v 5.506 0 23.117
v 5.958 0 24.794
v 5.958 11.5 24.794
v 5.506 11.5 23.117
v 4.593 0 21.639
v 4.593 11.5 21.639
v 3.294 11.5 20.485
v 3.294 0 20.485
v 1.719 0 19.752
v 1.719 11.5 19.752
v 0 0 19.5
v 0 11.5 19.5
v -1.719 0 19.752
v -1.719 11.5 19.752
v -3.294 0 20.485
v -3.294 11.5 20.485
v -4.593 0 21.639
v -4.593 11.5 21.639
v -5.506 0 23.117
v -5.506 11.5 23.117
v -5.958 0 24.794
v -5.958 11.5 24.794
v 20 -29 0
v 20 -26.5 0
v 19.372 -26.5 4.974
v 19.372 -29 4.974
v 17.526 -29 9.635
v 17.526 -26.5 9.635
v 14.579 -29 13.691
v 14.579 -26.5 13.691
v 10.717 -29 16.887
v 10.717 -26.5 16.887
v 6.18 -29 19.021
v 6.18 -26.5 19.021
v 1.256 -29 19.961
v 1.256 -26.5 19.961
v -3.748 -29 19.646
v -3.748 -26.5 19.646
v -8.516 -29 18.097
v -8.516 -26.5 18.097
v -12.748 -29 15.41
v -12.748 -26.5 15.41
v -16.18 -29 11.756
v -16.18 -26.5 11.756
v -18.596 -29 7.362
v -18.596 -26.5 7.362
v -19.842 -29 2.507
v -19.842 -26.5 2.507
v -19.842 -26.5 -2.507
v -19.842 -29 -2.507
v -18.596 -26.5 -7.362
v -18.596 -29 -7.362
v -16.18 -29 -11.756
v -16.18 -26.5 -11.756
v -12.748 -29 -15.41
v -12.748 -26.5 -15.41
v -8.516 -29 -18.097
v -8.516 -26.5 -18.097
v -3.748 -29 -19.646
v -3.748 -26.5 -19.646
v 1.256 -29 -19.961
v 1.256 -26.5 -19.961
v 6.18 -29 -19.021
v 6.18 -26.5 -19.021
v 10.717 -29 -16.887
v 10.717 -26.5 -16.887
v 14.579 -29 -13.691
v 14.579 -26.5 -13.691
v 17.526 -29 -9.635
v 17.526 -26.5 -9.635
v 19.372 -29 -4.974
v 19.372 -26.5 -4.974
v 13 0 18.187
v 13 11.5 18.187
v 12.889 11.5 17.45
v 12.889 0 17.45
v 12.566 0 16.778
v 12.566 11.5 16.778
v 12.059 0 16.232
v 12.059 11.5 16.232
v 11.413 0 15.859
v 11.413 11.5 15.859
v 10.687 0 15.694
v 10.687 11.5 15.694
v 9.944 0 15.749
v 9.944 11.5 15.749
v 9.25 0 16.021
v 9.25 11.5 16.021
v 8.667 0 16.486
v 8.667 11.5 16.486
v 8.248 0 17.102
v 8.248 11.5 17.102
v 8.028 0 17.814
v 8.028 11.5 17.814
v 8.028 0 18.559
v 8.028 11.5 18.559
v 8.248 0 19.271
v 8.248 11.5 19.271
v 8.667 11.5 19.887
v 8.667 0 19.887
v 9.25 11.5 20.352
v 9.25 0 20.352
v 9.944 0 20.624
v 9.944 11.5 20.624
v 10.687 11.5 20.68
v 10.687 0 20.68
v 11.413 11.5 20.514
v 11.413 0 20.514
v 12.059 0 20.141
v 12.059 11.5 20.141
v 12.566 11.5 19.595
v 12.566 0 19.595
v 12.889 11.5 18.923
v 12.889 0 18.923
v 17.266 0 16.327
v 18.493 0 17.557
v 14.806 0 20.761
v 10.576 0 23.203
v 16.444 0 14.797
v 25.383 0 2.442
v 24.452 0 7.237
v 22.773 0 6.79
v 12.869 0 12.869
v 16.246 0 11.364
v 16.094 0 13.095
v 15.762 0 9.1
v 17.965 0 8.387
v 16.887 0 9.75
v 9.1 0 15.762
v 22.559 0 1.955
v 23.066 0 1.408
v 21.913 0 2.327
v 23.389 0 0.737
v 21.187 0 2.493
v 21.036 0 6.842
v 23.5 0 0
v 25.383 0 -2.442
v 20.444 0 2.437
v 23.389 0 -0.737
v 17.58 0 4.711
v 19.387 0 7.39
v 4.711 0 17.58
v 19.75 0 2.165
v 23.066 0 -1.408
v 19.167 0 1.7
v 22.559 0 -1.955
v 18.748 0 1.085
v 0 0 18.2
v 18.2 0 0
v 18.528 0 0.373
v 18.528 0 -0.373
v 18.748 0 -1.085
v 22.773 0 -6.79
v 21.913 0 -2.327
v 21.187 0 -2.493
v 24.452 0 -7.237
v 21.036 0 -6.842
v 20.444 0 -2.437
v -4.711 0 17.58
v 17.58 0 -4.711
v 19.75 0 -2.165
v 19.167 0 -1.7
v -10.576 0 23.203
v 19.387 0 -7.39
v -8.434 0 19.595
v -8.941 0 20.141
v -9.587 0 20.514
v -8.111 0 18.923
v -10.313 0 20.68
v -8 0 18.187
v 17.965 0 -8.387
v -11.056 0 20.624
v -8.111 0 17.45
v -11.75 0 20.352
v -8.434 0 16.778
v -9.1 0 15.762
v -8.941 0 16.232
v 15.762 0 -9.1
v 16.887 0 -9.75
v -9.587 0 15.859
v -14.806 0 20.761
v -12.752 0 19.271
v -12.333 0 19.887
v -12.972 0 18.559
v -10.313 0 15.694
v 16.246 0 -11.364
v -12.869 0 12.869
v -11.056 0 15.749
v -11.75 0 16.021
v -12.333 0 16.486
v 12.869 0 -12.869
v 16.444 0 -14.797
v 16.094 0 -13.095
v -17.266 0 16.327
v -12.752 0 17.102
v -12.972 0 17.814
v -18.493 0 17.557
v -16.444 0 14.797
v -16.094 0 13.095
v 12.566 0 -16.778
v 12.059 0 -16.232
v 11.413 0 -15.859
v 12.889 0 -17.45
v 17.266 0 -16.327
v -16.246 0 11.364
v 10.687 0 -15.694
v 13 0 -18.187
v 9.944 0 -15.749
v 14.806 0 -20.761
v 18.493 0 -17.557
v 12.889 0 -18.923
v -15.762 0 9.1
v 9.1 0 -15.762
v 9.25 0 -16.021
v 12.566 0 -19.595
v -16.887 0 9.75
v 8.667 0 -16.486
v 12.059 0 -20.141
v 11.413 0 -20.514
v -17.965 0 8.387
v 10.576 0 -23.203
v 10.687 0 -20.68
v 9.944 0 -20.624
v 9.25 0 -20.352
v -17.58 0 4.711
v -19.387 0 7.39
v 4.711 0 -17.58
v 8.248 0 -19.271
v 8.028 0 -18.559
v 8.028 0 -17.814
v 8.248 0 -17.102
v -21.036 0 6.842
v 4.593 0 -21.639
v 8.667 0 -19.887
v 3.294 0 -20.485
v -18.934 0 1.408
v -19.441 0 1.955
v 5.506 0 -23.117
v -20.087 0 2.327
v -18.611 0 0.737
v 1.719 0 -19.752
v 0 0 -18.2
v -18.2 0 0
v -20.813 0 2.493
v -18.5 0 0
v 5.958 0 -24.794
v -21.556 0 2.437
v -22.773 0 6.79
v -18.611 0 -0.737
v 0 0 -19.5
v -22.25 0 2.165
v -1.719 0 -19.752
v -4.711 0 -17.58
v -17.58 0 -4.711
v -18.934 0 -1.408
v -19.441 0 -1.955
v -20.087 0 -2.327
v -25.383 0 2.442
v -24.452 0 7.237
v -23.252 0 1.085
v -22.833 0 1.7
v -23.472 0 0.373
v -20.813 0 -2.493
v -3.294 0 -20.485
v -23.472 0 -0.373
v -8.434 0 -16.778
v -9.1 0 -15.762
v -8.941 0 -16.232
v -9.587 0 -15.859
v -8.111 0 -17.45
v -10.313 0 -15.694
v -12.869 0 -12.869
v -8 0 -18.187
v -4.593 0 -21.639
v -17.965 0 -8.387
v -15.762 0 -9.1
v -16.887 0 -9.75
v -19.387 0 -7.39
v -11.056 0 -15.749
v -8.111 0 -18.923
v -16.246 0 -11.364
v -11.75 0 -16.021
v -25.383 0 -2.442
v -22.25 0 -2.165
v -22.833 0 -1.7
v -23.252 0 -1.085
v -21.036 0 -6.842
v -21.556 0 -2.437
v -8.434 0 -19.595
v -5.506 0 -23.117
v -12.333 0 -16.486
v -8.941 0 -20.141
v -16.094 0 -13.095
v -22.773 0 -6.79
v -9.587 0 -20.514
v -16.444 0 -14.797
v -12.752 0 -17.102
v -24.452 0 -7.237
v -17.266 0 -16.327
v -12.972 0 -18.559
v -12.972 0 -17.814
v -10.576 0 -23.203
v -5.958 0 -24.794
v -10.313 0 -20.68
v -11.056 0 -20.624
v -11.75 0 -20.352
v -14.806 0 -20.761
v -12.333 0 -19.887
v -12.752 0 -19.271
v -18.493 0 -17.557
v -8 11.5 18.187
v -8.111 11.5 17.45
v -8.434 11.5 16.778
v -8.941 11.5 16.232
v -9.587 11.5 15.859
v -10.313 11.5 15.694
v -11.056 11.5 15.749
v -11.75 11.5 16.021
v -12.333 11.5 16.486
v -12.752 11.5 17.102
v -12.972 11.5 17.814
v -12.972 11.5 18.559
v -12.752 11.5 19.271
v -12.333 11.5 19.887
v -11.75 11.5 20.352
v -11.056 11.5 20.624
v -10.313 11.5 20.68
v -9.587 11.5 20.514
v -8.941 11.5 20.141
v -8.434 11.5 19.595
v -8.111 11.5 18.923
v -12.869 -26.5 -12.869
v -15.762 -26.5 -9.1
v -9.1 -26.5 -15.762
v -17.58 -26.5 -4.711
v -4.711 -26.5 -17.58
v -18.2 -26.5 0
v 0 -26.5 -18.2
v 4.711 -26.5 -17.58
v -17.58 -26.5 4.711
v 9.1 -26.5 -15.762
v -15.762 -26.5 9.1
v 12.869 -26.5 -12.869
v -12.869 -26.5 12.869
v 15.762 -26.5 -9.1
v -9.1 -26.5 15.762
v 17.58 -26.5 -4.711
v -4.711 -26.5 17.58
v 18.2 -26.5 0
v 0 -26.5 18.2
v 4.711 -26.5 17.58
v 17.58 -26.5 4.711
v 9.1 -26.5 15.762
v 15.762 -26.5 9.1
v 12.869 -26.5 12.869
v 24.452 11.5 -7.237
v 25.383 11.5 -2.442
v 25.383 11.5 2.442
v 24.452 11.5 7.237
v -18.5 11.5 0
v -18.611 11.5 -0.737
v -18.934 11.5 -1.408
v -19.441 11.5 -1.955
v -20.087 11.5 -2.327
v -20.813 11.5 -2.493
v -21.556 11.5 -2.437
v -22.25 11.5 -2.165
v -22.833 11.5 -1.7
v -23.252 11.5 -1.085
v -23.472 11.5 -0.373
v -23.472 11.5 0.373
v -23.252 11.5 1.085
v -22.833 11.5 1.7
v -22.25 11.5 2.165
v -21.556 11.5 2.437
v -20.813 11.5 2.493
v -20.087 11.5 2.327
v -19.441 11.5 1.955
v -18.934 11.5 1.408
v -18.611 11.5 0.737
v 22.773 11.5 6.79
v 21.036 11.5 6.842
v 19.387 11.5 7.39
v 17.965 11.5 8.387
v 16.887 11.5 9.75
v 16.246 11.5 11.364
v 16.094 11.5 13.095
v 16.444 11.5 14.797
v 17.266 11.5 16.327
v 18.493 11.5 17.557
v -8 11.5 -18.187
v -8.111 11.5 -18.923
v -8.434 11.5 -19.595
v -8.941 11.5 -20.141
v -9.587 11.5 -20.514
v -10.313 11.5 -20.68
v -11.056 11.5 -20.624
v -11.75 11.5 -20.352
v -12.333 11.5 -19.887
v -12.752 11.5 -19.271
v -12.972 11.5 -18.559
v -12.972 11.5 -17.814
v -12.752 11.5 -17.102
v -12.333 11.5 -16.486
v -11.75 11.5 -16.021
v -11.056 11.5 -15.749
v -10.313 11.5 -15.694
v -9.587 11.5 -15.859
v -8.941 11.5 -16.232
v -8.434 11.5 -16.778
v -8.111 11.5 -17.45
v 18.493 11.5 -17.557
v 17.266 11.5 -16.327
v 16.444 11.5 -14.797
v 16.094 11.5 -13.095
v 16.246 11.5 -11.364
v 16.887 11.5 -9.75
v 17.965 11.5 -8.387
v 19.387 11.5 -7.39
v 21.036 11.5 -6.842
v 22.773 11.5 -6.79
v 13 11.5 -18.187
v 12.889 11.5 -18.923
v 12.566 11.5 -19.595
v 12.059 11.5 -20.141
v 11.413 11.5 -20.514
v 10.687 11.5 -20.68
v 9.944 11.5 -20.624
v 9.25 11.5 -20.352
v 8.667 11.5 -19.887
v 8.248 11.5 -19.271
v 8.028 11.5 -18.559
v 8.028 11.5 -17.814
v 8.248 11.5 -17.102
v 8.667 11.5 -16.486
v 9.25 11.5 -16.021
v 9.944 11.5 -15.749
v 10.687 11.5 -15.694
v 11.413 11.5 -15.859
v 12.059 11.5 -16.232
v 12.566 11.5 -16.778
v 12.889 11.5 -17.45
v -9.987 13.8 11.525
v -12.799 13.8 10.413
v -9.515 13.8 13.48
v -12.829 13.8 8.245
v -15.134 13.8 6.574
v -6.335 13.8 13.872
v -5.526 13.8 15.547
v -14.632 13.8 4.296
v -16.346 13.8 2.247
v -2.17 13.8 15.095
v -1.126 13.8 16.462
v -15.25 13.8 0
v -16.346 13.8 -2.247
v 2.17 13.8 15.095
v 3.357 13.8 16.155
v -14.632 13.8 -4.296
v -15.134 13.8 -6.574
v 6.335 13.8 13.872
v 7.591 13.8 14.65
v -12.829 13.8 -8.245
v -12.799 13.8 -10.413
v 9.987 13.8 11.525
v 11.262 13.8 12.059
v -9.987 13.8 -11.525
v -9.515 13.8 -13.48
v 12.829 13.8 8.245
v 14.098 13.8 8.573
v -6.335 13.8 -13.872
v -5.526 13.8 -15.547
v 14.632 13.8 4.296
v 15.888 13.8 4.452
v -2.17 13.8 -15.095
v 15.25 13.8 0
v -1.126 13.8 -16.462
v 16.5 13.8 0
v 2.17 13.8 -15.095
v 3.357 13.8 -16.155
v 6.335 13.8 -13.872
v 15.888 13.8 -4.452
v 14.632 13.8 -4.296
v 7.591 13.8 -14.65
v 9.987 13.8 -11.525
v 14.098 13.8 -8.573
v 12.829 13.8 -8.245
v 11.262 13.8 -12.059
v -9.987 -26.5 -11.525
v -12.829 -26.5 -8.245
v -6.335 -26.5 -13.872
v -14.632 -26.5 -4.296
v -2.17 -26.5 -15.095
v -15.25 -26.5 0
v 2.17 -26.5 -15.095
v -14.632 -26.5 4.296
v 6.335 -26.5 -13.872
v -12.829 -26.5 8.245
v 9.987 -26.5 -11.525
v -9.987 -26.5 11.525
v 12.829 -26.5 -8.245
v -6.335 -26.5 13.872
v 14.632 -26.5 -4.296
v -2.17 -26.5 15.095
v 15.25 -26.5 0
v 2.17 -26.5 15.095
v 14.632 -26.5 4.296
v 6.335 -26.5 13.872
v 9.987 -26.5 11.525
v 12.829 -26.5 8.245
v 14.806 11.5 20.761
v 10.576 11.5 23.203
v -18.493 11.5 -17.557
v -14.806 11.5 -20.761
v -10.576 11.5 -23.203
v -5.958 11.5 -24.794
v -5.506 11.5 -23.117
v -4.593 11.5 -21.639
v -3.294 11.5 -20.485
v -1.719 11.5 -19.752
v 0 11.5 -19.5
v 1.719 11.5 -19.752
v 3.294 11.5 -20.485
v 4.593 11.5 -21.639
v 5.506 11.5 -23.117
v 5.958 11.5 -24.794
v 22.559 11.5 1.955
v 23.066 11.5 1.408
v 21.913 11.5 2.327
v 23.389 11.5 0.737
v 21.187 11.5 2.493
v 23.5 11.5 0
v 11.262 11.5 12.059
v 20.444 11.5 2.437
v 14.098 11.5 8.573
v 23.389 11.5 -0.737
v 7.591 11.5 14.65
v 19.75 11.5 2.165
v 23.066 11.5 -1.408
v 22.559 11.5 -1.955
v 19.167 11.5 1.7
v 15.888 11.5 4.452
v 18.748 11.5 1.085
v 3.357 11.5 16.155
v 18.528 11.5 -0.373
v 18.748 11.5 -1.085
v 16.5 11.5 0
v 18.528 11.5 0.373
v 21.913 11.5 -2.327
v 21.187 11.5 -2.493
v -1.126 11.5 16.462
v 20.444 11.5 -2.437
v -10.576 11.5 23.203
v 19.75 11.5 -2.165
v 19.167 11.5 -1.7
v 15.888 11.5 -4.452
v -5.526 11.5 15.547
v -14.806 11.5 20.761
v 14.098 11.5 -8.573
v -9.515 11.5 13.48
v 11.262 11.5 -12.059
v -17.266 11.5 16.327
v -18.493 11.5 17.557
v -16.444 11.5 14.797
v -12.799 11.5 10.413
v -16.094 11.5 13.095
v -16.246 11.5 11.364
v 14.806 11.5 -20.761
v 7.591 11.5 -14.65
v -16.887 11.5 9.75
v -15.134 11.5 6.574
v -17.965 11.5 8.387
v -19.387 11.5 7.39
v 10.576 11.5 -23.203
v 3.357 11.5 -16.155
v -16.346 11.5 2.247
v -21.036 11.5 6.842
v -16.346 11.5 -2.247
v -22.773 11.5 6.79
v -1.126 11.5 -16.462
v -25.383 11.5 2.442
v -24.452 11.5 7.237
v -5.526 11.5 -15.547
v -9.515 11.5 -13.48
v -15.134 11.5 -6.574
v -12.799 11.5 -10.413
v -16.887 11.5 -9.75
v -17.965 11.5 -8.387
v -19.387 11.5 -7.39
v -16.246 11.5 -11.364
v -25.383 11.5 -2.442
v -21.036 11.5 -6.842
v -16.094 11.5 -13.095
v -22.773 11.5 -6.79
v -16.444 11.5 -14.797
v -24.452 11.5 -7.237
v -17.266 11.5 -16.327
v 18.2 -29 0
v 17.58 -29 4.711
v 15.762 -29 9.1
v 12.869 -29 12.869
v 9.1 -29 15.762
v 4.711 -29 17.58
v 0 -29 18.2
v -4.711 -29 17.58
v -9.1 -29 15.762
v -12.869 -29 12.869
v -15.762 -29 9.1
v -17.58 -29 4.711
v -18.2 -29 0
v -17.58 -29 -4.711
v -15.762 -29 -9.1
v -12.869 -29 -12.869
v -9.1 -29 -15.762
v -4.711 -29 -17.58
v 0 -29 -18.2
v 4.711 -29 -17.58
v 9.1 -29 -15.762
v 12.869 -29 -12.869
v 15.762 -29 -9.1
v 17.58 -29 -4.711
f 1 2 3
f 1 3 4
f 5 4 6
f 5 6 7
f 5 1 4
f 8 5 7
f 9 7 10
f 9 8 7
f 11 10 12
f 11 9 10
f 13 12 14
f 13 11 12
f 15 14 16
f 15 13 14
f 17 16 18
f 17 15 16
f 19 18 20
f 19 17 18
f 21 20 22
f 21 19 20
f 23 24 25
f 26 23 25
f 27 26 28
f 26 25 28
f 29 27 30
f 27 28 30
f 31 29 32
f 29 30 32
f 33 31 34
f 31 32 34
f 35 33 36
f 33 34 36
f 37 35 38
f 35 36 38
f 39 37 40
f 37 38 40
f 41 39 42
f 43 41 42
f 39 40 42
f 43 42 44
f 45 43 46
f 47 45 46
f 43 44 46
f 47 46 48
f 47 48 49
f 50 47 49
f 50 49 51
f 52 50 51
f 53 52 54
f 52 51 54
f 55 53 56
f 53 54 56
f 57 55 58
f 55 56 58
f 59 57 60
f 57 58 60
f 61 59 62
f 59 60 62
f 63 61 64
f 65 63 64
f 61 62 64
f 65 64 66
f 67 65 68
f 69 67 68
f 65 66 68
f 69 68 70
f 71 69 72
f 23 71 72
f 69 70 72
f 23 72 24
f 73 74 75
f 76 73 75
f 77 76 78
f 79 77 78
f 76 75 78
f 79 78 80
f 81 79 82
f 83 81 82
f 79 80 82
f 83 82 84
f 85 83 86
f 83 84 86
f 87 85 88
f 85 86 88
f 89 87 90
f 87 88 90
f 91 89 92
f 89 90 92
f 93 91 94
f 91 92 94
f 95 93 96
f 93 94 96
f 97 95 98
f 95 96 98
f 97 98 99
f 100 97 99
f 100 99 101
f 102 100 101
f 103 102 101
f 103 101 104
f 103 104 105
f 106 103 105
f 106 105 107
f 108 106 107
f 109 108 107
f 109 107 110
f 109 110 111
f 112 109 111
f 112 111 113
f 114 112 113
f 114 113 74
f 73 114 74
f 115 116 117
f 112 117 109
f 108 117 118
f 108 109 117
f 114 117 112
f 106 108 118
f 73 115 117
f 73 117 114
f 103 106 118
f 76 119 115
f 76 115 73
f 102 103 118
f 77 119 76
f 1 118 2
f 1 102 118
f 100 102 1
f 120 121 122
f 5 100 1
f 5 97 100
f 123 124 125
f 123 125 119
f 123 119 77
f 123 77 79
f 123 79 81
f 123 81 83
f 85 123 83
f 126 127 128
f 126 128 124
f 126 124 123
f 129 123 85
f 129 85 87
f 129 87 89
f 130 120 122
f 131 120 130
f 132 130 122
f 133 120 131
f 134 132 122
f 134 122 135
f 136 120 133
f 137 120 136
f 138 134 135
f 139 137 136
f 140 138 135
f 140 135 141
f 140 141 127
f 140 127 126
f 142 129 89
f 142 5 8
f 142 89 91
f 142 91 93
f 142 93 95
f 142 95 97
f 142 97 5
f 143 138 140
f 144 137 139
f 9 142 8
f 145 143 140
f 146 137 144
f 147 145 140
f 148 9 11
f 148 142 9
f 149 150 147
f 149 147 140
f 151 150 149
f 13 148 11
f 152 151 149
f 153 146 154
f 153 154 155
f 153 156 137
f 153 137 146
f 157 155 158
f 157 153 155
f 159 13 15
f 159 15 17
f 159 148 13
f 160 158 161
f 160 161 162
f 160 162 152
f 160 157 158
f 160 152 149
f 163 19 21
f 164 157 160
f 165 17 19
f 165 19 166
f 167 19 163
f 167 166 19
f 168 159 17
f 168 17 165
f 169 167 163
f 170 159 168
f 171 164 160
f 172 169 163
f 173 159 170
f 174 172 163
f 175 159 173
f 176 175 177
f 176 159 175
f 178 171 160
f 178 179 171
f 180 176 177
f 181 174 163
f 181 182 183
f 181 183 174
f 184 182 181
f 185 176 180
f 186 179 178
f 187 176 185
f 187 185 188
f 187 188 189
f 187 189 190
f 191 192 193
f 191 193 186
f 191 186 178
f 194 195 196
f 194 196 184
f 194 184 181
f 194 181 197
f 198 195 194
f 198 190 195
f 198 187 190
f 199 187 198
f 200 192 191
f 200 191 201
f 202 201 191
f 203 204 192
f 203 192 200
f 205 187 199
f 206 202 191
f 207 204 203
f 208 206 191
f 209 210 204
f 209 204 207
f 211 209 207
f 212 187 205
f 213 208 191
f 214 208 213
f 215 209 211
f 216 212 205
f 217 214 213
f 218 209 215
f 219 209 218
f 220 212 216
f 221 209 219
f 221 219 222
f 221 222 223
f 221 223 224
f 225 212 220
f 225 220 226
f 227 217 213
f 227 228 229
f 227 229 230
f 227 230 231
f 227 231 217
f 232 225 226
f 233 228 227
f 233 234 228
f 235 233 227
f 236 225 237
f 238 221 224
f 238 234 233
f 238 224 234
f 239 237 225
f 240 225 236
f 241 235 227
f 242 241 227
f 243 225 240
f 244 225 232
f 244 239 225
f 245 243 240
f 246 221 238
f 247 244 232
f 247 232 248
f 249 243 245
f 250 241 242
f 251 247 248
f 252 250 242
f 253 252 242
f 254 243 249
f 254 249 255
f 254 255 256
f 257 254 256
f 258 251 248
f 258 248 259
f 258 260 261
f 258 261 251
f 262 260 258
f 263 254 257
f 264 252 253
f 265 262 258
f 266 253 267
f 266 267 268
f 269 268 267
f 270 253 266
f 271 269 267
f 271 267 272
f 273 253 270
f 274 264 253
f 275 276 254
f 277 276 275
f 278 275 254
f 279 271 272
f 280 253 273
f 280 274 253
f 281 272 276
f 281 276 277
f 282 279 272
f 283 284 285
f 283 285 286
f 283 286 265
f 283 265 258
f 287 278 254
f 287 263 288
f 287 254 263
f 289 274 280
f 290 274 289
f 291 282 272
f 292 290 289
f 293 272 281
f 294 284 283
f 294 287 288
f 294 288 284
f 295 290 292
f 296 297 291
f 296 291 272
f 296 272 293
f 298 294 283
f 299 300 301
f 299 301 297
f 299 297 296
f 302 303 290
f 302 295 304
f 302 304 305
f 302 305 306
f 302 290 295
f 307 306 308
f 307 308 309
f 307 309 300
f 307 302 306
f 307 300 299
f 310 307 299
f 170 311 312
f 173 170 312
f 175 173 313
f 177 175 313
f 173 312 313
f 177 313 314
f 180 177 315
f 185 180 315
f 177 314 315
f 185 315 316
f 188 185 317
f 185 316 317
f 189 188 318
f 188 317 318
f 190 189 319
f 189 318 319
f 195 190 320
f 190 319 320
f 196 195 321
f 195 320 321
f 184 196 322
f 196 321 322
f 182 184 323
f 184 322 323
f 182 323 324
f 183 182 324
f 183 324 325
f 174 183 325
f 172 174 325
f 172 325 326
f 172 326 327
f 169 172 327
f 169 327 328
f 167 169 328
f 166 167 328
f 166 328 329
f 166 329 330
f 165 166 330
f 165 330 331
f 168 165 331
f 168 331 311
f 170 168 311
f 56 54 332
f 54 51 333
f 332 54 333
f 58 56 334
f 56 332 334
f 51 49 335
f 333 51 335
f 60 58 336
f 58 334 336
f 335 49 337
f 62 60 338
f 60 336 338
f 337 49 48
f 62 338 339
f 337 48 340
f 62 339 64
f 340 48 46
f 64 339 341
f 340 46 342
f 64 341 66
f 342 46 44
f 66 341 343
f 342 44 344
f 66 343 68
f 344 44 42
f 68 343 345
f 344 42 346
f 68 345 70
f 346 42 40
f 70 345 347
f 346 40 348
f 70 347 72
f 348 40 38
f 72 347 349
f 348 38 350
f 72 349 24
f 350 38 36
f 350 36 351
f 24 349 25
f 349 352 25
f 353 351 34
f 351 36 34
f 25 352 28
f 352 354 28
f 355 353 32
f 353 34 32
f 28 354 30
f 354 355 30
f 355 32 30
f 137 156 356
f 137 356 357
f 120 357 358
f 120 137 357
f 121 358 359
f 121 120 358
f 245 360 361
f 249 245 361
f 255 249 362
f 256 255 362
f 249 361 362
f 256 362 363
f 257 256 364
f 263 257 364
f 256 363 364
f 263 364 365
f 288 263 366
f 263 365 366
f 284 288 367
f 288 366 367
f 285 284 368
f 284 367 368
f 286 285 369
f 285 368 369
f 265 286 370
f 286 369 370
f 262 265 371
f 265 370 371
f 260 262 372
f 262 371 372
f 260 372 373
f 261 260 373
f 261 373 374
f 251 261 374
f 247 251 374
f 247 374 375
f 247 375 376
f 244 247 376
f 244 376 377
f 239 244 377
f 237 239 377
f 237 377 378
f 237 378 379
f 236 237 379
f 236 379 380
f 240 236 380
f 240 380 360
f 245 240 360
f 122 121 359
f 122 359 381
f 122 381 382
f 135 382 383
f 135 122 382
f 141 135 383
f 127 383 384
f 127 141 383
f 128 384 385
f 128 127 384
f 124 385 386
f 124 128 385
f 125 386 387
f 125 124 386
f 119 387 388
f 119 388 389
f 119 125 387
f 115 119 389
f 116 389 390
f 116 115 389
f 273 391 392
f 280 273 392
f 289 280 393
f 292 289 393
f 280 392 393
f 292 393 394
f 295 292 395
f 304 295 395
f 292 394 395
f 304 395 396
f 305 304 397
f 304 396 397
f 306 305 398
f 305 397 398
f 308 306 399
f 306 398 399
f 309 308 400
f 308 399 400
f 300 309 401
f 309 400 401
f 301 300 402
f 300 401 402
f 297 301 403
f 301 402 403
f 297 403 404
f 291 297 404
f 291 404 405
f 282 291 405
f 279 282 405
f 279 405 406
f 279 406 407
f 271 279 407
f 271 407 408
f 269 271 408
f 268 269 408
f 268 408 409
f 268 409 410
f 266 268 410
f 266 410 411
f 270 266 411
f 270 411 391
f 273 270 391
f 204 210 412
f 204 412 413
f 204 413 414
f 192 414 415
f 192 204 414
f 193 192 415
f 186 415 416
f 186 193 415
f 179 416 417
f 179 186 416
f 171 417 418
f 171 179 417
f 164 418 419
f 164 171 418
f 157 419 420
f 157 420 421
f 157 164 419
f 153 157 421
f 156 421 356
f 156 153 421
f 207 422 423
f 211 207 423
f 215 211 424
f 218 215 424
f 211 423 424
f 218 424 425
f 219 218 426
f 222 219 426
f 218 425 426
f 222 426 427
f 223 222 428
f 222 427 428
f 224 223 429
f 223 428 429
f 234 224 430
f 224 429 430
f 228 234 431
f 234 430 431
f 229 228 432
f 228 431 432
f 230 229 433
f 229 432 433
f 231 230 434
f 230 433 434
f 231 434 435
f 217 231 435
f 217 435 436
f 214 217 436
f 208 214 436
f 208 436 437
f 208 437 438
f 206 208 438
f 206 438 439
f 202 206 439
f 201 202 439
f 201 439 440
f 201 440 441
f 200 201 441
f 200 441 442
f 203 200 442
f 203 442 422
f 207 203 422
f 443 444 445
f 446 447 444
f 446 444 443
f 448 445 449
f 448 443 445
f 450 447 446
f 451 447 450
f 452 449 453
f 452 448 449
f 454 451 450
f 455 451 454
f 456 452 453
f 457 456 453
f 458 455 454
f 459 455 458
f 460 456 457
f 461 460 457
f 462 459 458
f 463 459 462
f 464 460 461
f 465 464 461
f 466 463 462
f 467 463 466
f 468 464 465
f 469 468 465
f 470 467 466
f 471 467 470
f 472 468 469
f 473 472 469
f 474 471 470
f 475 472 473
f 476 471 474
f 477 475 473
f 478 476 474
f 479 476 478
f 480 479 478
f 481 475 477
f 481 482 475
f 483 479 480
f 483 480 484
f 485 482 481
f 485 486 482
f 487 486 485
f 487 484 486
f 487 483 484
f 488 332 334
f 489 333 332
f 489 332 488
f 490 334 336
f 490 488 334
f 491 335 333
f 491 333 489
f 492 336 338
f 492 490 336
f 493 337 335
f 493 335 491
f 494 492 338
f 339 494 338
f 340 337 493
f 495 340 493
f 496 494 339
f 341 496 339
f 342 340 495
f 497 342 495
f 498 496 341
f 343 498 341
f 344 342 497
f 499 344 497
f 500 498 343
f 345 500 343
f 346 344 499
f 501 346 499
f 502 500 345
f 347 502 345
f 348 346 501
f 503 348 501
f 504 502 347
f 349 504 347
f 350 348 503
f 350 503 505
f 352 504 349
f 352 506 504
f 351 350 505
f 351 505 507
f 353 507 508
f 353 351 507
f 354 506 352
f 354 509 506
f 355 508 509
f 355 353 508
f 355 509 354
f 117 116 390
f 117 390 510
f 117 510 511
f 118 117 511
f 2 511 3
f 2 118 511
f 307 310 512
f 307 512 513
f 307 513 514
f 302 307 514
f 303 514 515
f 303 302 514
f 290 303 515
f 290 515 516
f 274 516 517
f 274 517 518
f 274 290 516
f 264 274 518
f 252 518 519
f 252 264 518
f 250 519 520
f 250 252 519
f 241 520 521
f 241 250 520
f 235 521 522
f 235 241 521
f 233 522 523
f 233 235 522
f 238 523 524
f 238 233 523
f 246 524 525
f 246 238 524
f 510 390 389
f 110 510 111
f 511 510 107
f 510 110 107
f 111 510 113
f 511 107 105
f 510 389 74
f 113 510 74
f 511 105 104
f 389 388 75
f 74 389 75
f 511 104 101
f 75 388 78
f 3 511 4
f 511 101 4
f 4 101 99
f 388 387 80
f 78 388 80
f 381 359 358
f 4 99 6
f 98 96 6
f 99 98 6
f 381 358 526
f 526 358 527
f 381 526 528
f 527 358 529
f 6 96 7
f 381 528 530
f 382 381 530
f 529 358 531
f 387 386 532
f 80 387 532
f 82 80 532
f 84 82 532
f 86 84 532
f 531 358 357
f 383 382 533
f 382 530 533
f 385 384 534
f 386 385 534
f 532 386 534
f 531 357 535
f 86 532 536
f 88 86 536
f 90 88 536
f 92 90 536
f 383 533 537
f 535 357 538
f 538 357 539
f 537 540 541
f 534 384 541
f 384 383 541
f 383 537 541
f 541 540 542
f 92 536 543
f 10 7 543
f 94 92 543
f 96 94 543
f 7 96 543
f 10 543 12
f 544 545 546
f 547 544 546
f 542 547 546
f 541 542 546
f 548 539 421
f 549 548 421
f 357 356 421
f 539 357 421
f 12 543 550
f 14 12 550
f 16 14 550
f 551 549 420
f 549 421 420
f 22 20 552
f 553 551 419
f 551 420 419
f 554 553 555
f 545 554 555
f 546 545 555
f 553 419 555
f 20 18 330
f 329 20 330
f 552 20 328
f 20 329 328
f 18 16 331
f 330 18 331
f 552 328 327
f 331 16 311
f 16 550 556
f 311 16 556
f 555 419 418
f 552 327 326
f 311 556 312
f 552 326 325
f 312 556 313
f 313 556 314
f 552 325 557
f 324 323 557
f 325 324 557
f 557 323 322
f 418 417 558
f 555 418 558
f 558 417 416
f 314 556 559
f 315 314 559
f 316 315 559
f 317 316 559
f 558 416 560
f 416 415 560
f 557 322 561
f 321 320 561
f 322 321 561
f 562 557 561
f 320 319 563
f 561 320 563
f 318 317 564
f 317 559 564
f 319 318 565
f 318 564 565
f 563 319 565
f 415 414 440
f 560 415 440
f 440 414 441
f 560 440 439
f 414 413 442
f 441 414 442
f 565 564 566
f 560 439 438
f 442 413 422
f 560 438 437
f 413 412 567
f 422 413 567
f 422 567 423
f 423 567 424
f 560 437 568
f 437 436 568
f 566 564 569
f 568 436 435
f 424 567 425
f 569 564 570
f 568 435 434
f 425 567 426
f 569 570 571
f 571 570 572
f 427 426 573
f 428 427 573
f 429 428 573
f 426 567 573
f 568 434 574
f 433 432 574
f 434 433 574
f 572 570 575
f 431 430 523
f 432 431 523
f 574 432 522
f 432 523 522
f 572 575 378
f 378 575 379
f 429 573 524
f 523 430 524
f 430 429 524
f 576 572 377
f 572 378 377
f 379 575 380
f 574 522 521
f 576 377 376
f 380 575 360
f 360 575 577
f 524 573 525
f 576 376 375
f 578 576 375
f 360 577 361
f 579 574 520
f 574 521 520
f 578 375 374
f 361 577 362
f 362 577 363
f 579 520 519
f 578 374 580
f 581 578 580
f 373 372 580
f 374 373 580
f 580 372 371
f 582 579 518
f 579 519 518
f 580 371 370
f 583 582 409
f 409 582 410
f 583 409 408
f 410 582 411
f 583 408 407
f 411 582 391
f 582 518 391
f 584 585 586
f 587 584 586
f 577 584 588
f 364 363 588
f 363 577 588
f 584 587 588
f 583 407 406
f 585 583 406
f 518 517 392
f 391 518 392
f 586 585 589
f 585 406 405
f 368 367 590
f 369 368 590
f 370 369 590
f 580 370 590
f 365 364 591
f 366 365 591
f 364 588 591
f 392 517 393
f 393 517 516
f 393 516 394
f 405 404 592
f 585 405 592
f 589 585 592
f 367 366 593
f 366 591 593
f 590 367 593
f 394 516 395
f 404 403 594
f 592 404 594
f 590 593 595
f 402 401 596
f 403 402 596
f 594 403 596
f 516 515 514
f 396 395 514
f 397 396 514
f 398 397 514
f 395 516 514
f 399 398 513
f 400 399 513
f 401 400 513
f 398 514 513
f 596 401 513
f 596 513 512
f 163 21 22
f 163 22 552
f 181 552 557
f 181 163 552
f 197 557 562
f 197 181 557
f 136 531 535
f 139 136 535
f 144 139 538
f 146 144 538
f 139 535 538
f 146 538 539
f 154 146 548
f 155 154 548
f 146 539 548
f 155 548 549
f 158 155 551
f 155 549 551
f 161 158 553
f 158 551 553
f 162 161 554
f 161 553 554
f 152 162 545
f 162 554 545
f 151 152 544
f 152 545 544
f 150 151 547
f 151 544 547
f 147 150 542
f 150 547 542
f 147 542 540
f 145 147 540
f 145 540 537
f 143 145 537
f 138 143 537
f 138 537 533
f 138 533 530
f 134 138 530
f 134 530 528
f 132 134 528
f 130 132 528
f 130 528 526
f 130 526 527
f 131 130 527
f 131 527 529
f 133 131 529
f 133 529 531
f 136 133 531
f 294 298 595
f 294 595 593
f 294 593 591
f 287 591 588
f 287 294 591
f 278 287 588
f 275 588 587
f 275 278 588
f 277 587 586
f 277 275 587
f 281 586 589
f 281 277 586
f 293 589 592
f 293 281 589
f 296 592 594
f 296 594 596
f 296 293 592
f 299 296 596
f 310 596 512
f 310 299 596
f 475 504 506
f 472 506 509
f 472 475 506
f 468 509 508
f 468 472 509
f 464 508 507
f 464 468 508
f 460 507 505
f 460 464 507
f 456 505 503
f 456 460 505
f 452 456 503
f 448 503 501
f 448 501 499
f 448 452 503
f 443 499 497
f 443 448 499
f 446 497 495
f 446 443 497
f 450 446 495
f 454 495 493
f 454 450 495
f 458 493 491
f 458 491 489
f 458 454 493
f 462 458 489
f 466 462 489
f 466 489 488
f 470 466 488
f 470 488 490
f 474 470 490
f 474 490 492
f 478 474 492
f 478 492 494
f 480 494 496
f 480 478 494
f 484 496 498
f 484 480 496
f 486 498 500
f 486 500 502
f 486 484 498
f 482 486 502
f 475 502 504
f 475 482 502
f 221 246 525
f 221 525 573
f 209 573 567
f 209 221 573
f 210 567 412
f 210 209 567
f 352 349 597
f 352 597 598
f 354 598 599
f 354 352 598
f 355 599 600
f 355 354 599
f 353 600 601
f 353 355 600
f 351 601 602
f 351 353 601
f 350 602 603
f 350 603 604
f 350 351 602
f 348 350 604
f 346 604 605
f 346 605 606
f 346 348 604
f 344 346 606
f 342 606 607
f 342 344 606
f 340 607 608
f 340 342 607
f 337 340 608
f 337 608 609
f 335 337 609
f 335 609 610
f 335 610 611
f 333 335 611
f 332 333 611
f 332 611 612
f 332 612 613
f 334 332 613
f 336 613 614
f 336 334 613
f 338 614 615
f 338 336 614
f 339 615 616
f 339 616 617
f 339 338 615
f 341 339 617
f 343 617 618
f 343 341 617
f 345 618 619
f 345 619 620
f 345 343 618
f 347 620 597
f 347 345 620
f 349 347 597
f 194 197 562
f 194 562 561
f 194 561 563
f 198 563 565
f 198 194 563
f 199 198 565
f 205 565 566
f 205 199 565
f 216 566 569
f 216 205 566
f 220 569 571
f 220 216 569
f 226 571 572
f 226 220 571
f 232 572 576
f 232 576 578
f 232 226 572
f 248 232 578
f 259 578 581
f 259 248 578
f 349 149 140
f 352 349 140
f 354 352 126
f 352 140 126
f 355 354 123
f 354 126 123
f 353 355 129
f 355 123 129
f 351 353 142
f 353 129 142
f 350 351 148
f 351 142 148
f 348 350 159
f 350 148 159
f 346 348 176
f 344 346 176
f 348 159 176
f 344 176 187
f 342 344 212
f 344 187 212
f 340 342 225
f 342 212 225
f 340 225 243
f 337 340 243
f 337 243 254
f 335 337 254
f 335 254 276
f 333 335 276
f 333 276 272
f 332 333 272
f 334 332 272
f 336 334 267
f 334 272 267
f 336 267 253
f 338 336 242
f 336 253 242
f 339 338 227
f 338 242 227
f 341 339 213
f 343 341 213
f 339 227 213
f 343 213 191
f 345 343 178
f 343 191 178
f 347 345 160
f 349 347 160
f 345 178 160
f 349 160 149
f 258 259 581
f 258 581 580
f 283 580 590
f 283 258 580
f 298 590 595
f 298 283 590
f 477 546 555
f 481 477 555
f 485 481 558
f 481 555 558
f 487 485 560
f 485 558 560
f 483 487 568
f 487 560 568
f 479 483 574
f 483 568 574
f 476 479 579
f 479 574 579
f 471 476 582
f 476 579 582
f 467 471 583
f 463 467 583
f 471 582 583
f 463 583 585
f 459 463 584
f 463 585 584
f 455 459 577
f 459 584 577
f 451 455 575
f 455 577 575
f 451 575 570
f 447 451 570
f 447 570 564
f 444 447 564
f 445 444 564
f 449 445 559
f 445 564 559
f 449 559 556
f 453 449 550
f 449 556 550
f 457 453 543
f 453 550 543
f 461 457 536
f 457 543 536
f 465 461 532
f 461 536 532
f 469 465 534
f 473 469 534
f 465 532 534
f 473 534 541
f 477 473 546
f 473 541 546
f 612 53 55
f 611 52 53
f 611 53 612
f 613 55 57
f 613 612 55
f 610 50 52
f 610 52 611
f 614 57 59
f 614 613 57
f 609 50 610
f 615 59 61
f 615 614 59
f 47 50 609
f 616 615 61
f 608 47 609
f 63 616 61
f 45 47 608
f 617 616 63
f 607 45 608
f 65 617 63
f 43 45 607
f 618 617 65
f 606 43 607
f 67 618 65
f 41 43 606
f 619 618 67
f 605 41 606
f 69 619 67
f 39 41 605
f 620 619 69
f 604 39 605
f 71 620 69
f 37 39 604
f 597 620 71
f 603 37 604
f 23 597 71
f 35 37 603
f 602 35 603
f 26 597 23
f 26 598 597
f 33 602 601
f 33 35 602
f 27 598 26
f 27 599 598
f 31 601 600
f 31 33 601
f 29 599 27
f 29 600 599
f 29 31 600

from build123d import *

# Parameters (mm, degrees)
EXTRUDE_1_DEPTH     = 11.5
SKETCH_2_R          = 16.5
SKETCH_2_R_2        = 15.25
EXTRUDE_2_DEPTH     = 2.3
SKETCH_3_R          = 15.25
CUT_EXTRUDE_2_DEPTH = 12.5
SKETCH_4_R          = 18.2
SKETCH_4_R_2        = 15.25
EXTRUDE_3_DEPTH     = 26.5
SKETCH_5_R          = 20
SKETCH_5_R_2        = 18.2
EXTRUDE_4_DEPTH     = 2.5
SKETCH_7_R          = 2.5
CUT_EXTRUDE_4_DEPTH = 19


with BuildPart() as part:
    # ｽｹｯﾁ1 → ﾎﾞｽ - 押し出し1 (new body)
    with BuildSketch(Plane(origin=(0, 0, 0), x_dir=(1, 0, 0), z_dir=(0, 1, 0))):
        with BuildLine():
            ThreePointArc((-5.958332829, 24.794117647), (0, 19.5), (5.958332829, 24.794117647))
            ThreePointArc((5.958332829, 24.794117647), (12.75, 22.083647797), (18.493169332, 17.557126418))
            ThreePointArc((18.493169332, 17.557126418), (16.887495374, 9.75), (24.451502161, 7.236991229))
            ThreePointArc((24.451502161, 7.236991229), (25.5, 0), (24.451502161, -7.236991229))
            ThreePointArc((24.451502161, -7.236991229), (16.887495374, -9.75), (18.493169332, -17.557126418))
            ThreePointArc((18.493169332, -17.557126418), (12.75, -22.083647797), (5.958332829, -24.794117647))
            ThreePointArc((5.958332829, -24.794117647), (0, -19.5), (-5.958332829, -24.794117647))
            ThreePointArc((-5.958332829, -24.794117647), (-12.75, -22.083647797), (-18.493169332, -17.557126418))
            ThreePointArc((-18.493169332, -17.557126418), (-16.887495374, -9.75), (-24.451502161, -7.236991229))
            ThreePointArc((-24.451502161, -7.236991229), (-25.5, 0), (-24.451502161, 7.236991229))
            ThreePointArc((-24.451502161, 7.236991229), (-16.887495374, 9.75), (-18.493169332, 17.557126418))
            ThreePointArc((-18.493169332, 17.557126418), (-12.75, 22.083647797), (-5.958332829, 24.794117647))
        make_face()
    extrude(amount=EXTRUDE_1_DEPTH)

    # ｽｹｯﾁ2 → ﾎﾞｽ - 押し出し2 (add)
    with BuildSketch(Plane(origin=(0, 11.5, 0), x_dir=(1, 0, 0), z_dir=(0, 1, 0))):
        Circle(SKETCH_2_R)
        Circle(SKETCH_2_R_2, mode=Mode.SUBTRACT)
    extrude(amount=EXTRUDE_2_DEPTH)

    # ｽｹｯﾁ3 → ｶｯﾄ - 押し出し2 (cut, through all)
    with BuildSketch(Plane(origin=(0, 11.5, 0), x_dir=(1, 0, 0), z_dir=(0, 1, 0))):
        Circle(SKETCH_3_R)
    extrude(amount=-CUT_EXTRUDE_2_DEPTH, mode=Mode.SUBTRACT)

    # ｽｹｯﾁ4 → ﾎﾞｽ - 押し出し3 (add)
    with BuildSketch(Plane.XZ):
        Circle(SKETCH_4_R)
        Circle(SKETCH_4_R_2, mode=Mode.SUBTRACT)
    extrude(amount=EXTRUDE_3_DEPTH)

    # ｽｹｯﾁ7 → ｶｯﾄ - 押し出し4 (cut)
    with BuildSketch(Plane(origin=(0, 11.5, 0), x_dir=(1, 0, 0), z_dir=(0, 1, 0))):
        with Locations((21, 0)):
            Circle(SKETCH_7_R)
        with Locations((10.5, -18.186533479)):
            Circle(SKETCH_7_R)
        with Locations((-10.5, -18.186533479)):
            Circle(SKETCH_7_R)
        with Locations((-21, 0)):
            Circle(SKETCH_7_R)
        with Locations((-10.5, 18.186533479)):
            Circle(SKETCH_7_R)
        with Locations((10.5, 18.186533479)):
            Circle(SKETCH_7_R)
    extrude(amount=-CUT_EXTRUDE_4_DEPTH, mode=Mode.SUBTRACT)


with BuildPart() as body_2:
    # ｽｹｯﾁ5 → ﾎﾞｽ - 押し出し4 (new body)
    with BuildSketch(Plane.XZ.offset(26.5)):
        Circle(SKETCH_5_R)
        Circle(SKETCH_5_R_2, mode=Mode.SUBTRACT)
    extrude(amount=EXTRUDE_4_DEPTH)


solid = Compound([part.part, body_2.part])
